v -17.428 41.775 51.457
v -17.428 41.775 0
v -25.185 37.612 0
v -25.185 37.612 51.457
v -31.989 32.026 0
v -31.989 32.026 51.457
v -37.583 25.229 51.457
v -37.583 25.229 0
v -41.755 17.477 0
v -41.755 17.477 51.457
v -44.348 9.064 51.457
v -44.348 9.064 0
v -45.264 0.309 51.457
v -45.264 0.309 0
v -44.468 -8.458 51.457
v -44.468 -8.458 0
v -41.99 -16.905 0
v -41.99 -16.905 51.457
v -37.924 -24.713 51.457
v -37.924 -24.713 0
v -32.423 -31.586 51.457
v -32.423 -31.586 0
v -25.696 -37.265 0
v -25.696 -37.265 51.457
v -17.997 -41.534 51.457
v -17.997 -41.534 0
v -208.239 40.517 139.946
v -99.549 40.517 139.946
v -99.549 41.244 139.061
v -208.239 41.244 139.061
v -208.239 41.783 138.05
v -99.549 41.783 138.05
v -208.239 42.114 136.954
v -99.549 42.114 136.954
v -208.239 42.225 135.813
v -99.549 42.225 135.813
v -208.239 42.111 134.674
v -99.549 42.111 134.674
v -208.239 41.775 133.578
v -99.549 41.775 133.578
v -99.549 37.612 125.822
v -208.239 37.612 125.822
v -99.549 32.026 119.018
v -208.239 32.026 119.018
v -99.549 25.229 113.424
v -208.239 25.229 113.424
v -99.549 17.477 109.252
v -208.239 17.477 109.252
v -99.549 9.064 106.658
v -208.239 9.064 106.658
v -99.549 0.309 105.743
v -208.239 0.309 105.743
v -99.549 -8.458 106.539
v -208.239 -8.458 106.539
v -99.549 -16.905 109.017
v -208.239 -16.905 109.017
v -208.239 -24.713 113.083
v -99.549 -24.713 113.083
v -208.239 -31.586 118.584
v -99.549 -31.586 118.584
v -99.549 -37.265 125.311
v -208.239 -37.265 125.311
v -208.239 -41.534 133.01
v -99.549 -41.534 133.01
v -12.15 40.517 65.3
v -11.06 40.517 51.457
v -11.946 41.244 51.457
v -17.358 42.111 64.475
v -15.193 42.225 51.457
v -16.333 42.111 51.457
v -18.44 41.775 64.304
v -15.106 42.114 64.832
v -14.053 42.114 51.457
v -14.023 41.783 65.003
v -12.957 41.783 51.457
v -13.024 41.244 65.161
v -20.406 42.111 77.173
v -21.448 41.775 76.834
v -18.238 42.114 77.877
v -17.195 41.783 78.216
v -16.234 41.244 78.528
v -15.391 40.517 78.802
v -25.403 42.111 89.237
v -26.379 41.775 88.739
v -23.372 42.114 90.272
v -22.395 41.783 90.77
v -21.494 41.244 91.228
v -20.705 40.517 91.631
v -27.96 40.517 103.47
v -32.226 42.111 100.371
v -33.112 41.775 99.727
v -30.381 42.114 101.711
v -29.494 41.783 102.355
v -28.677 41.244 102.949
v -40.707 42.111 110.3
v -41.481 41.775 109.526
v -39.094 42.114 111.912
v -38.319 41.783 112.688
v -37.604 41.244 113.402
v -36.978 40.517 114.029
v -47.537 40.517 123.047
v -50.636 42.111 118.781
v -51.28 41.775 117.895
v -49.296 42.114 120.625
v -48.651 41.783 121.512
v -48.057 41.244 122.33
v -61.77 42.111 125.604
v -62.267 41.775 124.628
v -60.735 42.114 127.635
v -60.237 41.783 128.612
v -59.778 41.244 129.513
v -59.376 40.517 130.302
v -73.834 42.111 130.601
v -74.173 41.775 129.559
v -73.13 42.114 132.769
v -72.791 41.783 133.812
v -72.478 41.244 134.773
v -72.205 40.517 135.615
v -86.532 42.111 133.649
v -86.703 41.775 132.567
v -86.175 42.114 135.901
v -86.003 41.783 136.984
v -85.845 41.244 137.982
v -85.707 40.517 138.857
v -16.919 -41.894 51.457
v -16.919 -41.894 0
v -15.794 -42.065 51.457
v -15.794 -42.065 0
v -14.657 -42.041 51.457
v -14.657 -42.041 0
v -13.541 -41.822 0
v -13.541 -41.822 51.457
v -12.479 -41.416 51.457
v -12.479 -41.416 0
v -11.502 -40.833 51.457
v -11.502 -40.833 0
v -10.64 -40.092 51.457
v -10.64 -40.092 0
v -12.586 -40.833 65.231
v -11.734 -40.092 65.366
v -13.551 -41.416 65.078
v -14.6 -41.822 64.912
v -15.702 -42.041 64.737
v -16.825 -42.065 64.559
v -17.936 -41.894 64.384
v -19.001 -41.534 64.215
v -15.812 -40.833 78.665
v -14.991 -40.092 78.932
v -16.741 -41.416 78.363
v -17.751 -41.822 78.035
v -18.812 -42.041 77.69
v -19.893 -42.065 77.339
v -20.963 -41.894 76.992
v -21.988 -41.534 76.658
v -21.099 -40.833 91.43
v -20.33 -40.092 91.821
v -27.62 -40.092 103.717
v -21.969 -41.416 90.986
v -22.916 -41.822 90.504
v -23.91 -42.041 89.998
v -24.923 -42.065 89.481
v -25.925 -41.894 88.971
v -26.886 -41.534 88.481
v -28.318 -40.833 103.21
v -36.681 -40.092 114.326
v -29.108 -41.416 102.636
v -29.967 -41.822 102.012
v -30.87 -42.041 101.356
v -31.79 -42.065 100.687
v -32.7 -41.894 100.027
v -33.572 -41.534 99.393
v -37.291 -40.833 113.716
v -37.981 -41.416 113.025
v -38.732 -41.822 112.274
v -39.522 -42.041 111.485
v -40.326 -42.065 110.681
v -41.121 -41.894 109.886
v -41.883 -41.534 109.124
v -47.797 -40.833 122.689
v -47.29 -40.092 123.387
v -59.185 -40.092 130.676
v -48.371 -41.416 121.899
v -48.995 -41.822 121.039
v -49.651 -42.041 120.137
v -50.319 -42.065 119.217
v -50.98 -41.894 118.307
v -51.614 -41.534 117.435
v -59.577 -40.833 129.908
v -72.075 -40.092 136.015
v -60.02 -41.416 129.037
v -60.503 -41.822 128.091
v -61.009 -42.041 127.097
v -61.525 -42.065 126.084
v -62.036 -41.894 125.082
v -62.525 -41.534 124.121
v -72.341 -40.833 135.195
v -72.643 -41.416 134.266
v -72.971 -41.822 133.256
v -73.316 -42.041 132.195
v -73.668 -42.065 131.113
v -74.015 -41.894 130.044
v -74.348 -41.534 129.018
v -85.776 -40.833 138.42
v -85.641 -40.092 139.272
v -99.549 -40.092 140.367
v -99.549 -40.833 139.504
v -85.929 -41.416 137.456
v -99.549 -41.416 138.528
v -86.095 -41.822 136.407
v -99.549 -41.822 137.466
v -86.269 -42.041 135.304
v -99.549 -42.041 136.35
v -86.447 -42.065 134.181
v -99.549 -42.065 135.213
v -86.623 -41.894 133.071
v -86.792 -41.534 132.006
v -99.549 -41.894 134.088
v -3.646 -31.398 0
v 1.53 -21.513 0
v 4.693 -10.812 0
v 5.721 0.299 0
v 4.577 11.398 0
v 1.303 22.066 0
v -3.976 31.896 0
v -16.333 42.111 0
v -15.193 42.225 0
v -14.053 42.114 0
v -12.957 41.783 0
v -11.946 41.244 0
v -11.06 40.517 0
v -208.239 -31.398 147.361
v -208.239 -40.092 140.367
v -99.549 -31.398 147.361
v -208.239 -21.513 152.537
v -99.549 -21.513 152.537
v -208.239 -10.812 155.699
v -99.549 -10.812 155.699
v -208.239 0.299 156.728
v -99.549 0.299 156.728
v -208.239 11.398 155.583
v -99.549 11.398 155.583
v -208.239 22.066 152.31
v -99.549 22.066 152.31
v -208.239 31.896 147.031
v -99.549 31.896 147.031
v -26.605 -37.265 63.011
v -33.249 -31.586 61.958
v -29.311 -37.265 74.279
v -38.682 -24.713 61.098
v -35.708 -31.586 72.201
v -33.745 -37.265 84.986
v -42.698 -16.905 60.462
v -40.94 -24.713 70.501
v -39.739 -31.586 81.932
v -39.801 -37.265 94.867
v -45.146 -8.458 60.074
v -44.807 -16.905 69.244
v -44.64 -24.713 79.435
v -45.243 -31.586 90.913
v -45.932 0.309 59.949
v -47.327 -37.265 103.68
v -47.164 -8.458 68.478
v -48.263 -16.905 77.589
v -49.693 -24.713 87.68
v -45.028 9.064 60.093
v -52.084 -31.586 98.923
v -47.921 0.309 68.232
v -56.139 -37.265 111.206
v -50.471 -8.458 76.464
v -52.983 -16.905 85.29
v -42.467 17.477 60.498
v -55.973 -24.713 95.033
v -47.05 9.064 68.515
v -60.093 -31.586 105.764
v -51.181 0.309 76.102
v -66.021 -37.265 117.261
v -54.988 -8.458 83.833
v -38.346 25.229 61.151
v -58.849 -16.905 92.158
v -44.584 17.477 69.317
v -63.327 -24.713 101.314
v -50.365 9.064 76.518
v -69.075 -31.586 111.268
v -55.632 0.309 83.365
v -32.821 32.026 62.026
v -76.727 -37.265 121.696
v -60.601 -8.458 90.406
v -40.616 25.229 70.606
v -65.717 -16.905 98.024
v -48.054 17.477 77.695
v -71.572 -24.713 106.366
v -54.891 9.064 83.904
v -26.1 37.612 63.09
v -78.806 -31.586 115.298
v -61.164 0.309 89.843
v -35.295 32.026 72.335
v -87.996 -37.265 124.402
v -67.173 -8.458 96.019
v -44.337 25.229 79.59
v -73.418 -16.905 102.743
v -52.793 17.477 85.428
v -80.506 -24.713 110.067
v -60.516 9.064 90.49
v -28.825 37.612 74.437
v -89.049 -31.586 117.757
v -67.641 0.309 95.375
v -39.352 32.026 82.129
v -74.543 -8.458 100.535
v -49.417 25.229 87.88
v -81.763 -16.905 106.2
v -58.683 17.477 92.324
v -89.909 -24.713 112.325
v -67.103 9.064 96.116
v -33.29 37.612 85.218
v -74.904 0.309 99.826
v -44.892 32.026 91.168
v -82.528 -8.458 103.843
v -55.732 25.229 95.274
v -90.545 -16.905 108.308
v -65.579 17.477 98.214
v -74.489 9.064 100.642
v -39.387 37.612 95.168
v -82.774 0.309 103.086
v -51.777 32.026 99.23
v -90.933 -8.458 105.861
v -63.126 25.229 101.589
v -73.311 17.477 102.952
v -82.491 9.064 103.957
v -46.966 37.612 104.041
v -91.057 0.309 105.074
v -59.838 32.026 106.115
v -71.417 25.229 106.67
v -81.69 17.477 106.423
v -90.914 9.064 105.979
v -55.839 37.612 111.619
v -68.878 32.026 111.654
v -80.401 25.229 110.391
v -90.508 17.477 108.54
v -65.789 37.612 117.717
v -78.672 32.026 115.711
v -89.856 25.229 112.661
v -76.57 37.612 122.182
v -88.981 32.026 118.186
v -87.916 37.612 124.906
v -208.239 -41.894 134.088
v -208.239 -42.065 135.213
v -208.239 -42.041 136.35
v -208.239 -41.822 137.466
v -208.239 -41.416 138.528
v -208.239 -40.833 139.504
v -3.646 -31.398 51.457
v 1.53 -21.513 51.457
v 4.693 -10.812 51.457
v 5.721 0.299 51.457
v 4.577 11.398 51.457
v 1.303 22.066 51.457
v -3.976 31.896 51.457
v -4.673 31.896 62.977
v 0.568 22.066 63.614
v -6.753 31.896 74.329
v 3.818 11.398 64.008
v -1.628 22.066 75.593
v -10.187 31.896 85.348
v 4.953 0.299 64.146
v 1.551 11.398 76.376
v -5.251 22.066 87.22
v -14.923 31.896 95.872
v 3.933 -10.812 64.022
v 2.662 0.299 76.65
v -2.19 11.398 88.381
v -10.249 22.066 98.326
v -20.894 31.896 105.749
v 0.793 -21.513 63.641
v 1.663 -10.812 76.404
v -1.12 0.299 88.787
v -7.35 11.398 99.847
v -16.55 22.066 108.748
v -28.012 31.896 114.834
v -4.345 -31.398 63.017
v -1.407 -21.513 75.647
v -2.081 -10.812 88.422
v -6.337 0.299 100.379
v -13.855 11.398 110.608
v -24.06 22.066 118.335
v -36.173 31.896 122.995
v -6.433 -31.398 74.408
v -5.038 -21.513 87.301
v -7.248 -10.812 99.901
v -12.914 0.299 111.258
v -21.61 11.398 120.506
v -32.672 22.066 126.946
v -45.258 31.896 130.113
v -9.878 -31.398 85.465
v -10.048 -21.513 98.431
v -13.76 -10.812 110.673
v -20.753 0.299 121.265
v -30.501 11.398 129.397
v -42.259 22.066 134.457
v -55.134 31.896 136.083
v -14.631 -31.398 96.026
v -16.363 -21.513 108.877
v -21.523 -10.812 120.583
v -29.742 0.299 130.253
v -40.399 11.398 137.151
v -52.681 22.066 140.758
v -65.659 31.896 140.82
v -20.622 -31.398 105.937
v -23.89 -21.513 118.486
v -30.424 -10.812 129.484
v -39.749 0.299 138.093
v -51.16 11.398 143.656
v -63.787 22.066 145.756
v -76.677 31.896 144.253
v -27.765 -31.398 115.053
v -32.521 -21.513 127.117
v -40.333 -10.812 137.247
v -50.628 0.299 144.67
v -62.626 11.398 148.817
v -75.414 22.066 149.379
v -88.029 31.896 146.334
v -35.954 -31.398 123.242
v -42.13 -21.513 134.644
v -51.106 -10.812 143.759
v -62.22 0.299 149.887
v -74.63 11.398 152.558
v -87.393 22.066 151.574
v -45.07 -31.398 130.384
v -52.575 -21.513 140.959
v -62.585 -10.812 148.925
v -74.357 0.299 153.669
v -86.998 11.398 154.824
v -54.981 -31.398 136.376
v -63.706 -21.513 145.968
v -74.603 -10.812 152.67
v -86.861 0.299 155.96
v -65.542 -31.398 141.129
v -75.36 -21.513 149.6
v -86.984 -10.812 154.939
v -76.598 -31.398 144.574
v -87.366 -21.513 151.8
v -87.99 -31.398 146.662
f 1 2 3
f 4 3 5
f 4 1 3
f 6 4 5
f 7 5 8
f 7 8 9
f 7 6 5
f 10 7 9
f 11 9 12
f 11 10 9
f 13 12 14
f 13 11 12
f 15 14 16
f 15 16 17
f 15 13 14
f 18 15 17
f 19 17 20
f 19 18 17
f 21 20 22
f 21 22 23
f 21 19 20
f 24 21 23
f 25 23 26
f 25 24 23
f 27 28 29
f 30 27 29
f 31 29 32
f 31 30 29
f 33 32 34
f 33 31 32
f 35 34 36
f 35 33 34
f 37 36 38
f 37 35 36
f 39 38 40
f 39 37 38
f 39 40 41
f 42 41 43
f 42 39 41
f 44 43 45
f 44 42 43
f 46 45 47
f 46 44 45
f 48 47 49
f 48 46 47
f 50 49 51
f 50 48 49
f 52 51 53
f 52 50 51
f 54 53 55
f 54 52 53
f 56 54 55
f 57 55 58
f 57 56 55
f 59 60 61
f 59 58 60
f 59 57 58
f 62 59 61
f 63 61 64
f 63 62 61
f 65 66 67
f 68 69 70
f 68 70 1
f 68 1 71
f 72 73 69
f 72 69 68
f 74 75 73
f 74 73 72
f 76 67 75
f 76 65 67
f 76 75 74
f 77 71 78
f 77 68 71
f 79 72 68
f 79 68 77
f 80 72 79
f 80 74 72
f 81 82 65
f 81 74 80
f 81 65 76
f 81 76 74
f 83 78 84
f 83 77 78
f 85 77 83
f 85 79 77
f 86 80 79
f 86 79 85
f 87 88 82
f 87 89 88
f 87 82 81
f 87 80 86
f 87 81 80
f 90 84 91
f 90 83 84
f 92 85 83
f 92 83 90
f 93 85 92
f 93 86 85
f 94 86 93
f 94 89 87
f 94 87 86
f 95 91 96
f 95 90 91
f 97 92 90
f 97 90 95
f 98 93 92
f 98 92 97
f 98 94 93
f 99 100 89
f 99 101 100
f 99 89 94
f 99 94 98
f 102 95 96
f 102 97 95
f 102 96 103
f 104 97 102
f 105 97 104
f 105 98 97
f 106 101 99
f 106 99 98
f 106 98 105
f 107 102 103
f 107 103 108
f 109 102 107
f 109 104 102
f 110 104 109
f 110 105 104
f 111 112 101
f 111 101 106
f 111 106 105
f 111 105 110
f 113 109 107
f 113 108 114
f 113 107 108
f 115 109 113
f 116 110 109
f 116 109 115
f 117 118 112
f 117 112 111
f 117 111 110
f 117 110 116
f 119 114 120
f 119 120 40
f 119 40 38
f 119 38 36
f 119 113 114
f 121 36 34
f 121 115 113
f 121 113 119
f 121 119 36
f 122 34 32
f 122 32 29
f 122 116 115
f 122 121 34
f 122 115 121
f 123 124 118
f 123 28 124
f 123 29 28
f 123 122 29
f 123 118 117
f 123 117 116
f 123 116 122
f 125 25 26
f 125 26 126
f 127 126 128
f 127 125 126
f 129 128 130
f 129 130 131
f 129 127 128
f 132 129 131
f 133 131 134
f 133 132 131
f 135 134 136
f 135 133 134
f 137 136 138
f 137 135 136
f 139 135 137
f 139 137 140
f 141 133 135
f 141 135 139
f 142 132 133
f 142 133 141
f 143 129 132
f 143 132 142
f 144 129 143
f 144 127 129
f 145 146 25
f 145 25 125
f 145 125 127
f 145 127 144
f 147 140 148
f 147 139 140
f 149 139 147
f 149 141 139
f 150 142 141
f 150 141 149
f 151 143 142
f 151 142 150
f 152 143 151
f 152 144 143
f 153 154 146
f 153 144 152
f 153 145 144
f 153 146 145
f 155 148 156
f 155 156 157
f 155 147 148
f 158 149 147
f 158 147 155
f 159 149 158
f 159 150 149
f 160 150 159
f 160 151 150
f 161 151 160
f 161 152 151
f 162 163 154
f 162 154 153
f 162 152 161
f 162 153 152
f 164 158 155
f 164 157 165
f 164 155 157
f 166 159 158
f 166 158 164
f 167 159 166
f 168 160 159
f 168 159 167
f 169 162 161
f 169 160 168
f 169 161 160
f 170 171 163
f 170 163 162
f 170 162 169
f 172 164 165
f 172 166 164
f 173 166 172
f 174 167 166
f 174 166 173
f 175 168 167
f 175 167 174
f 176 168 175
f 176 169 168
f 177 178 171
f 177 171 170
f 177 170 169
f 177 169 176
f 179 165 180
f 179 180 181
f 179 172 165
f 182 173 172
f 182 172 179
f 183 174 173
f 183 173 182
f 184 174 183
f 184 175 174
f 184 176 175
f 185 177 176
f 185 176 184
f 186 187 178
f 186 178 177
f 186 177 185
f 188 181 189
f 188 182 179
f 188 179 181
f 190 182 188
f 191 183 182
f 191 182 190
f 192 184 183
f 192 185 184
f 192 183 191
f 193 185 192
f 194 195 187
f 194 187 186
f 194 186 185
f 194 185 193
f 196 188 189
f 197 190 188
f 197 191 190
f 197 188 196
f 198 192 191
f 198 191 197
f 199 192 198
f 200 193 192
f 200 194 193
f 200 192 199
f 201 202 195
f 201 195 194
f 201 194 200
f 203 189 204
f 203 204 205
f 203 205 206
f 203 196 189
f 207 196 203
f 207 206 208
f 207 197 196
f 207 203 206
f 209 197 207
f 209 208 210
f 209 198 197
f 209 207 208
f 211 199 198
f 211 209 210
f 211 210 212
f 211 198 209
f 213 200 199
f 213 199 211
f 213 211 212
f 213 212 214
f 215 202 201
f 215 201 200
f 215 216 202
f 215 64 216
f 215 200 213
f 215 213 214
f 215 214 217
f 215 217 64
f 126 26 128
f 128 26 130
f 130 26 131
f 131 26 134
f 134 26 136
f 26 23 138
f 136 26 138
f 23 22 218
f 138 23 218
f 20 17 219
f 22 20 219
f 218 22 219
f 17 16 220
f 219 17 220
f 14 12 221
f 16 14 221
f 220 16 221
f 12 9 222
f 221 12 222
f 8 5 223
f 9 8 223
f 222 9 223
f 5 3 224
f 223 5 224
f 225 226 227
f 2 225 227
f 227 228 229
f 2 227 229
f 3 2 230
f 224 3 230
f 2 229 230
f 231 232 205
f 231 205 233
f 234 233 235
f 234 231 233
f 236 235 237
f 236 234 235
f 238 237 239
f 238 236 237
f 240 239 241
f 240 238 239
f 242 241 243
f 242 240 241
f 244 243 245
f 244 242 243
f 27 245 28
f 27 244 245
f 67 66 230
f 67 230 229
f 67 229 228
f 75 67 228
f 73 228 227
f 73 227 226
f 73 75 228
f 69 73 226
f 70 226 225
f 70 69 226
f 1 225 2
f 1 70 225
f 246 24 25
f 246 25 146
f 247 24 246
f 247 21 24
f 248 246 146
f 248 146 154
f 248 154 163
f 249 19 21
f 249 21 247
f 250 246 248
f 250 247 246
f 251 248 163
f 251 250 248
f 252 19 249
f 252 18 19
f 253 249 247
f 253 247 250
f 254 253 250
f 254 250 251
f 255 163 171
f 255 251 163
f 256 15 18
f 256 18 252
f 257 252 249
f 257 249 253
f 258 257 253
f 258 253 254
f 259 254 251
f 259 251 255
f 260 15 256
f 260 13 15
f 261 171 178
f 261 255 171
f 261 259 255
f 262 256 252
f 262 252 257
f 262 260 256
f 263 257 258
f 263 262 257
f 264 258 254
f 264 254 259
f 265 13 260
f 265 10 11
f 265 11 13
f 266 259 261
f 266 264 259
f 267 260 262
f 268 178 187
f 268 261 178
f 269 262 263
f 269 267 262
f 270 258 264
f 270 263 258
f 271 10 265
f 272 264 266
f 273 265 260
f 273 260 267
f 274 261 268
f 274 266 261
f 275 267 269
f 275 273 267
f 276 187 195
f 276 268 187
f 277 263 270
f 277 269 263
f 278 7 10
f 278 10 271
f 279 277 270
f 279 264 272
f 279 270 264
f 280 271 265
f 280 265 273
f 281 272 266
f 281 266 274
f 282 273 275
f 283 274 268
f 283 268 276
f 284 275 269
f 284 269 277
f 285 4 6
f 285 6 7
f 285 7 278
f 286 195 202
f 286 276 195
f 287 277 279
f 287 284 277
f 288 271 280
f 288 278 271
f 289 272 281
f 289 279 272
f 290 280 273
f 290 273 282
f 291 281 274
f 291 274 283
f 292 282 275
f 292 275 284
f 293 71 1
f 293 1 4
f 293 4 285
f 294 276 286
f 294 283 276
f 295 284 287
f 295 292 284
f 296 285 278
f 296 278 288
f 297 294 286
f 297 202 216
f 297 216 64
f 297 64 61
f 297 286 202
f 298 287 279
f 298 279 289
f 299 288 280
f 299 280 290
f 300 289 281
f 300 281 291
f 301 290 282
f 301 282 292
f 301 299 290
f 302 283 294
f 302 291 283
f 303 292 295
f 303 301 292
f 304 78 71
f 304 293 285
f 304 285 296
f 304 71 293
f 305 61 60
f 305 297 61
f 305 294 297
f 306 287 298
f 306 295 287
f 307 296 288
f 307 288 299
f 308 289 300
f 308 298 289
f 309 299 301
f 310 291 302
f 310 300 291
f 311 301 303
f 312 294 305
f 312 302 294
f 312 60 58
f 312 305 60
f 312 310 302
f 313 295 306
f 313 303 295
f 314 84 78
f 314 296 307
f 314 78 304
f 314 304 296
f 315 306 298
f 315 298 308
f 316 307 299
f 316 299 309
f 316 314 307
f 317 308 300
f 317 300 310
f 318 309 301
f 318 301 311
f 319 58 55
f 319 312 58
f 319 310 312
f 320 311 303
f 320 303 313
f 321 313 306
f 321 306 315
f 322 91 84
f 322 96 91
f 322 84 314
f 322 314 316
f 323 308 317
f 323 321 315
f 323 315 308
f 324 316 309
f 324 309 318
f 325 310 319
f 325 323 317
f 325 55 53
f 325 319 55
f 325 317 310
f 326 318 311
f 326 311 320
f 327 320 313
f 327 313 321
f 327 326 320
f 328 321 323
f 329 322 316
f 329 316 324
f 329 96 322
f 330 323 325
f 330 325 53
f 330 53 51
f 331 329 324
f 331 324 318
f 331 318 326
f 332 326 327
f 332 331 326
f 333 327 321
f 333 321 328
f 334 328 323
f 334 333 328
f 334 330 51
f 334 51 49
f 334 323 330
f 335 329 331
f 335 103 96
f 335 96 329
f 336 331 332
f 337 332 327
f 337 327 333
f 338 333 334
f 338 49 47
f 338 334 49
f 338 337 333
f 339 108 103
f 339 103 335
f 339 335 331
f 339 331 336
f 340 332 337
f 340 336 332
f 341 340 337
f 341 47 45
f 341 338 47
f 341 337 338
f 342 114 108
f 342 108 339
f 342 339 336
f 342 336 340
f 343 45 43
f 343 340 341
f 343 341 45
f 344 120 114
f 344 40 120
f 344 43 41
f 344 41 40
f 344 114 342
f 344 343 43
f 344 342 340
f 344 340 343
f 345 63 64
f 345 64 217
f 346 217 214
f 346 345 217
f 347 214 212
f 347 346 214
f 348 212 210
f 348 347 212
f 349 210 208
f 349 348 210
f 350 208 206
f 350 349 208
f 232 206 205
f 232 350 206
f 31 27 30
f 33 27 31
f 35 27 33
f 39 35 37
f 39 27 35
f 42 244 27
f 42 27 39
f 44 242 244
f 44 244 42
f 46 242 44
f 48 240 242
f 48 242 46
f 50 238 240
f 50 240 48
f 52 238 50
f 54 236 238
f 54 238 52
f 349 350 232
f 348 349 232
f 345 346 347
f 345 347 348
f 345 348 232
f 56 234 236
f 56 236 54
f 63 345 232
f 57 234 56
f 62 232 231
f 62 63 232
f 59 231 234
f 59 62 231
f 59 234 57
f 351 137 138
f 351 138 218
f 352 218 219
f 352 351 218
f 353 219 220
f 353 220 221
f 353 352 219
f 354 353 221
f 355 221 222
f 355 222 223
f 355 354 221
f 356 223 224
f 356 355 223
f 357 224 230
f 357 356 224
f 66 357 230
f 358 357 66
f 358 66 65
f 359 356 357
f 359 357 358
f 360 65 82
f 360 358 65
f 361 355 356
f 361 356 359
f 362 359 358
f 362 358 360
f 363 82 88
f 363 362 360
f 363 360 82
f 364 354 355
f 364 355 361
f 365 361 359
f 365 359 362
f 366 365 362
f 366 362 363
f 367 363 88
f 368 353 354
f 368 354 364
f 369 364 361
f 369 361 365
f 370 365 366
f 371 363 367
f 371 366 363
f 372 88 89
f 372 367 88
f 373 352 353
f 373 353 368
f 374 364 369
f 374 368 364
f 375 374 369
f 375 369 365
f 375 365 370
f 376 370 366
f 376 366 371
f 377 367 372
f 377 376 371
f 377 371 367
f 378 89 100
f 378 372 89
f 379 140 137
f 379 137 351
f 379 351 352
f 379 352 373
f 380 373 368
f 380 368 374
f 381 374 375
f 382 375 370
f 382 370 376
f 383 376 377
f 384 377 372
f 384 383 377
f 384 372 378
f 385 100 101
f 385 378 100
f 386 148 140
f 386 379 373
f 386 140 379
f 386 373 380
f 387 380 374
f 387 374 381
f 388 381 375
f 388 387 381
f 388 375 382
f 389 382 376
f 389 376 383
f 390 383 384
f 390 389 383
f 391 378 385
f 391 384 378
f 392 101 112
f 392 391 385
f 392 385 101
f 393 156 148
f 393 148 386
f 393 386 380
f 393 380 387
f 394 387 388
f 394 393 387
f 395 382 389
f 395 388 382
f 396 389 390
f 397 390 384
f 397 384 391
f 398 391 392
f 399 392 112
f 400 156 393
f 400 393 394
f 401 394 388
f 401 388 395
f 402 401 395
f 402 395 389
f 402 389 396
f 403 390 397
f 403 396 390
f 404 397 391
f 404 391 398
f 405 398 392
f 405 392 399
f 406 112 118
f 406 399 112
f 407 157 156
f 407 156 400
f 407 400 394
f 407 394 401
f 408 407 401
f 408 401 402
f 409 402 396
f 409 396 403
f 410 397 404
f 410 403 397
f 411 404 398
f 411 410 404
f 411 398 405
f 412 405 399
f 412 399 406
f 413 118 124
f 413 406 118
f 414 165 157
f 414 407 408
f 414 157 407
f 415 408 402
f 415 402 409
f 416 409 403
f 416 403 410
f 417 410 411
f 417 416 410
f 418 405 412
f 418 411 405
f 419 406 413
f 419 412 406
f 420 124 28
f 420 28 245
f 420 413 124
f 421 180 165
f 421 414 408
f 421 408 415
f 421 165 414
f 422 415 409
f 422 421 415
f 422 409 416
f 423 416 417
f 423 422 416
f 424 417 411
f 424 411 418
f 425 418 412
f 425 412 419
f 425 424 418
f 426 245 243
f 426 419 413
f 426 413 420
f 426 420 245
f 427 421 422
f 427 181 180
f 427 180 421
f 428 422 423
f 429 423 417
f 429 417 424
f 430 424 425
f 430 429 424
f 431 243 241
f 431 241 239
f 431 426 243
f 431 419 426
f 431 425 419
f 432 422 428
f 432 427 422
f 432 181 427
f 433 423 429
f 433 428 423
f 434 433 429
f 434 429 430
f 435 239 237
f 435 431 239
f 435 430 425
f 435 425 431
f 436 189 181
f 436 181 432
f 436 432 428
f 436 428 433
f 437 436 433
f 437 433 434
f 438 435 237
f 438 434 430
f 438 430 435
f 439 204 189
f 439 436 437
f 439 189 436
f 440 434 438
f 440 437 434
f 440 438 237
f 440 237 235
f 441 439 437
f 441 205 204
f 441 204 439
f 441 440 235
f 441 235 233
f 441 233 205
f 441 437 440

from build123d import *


with BuildPart() as f2:
    # F2: sweep along a path in F0
    with BuildLine(Plane.XZ) as f2_path:
        Line((0, 0), (0, 51.4572679996))
        ThreePointArc((0, 51.4572679996), (-29.1573684376, 121.8493823248), (-99.5494827628, 151.0067507625))
        Line((-99.5494827628, 151.0067507625), (-208.2385346019, 151.0067507625))
    # F1 (on Top) → F2 (sweep)
    with BuildSketch(Plane.XY):
        with BuildLine():
            ThreePointArc((-17.9969767891, -41.5336991378), (-14.094527486, -41.9556359374), (-10.6398630821, -40.0921888406))
            ThreePointArc((-10.6398630821, -40.0921888406), (5.7210400439, 0.2988613285), (-11.0602959901, 40.517051812))
            ThreePointArc((-11.0602959901, 40.517051812), (-14.0530889357, 42.1143611499), (-17.428490612, 41.7754359954))
            ThreePointArc((-17.428490612, 41.7754359954), (-45.2641572804, 0.3088742632), (-17.9969767891, -41.5336991378))
        make_face()
    sweep(path=f2_path.line)


solid = f2.part
